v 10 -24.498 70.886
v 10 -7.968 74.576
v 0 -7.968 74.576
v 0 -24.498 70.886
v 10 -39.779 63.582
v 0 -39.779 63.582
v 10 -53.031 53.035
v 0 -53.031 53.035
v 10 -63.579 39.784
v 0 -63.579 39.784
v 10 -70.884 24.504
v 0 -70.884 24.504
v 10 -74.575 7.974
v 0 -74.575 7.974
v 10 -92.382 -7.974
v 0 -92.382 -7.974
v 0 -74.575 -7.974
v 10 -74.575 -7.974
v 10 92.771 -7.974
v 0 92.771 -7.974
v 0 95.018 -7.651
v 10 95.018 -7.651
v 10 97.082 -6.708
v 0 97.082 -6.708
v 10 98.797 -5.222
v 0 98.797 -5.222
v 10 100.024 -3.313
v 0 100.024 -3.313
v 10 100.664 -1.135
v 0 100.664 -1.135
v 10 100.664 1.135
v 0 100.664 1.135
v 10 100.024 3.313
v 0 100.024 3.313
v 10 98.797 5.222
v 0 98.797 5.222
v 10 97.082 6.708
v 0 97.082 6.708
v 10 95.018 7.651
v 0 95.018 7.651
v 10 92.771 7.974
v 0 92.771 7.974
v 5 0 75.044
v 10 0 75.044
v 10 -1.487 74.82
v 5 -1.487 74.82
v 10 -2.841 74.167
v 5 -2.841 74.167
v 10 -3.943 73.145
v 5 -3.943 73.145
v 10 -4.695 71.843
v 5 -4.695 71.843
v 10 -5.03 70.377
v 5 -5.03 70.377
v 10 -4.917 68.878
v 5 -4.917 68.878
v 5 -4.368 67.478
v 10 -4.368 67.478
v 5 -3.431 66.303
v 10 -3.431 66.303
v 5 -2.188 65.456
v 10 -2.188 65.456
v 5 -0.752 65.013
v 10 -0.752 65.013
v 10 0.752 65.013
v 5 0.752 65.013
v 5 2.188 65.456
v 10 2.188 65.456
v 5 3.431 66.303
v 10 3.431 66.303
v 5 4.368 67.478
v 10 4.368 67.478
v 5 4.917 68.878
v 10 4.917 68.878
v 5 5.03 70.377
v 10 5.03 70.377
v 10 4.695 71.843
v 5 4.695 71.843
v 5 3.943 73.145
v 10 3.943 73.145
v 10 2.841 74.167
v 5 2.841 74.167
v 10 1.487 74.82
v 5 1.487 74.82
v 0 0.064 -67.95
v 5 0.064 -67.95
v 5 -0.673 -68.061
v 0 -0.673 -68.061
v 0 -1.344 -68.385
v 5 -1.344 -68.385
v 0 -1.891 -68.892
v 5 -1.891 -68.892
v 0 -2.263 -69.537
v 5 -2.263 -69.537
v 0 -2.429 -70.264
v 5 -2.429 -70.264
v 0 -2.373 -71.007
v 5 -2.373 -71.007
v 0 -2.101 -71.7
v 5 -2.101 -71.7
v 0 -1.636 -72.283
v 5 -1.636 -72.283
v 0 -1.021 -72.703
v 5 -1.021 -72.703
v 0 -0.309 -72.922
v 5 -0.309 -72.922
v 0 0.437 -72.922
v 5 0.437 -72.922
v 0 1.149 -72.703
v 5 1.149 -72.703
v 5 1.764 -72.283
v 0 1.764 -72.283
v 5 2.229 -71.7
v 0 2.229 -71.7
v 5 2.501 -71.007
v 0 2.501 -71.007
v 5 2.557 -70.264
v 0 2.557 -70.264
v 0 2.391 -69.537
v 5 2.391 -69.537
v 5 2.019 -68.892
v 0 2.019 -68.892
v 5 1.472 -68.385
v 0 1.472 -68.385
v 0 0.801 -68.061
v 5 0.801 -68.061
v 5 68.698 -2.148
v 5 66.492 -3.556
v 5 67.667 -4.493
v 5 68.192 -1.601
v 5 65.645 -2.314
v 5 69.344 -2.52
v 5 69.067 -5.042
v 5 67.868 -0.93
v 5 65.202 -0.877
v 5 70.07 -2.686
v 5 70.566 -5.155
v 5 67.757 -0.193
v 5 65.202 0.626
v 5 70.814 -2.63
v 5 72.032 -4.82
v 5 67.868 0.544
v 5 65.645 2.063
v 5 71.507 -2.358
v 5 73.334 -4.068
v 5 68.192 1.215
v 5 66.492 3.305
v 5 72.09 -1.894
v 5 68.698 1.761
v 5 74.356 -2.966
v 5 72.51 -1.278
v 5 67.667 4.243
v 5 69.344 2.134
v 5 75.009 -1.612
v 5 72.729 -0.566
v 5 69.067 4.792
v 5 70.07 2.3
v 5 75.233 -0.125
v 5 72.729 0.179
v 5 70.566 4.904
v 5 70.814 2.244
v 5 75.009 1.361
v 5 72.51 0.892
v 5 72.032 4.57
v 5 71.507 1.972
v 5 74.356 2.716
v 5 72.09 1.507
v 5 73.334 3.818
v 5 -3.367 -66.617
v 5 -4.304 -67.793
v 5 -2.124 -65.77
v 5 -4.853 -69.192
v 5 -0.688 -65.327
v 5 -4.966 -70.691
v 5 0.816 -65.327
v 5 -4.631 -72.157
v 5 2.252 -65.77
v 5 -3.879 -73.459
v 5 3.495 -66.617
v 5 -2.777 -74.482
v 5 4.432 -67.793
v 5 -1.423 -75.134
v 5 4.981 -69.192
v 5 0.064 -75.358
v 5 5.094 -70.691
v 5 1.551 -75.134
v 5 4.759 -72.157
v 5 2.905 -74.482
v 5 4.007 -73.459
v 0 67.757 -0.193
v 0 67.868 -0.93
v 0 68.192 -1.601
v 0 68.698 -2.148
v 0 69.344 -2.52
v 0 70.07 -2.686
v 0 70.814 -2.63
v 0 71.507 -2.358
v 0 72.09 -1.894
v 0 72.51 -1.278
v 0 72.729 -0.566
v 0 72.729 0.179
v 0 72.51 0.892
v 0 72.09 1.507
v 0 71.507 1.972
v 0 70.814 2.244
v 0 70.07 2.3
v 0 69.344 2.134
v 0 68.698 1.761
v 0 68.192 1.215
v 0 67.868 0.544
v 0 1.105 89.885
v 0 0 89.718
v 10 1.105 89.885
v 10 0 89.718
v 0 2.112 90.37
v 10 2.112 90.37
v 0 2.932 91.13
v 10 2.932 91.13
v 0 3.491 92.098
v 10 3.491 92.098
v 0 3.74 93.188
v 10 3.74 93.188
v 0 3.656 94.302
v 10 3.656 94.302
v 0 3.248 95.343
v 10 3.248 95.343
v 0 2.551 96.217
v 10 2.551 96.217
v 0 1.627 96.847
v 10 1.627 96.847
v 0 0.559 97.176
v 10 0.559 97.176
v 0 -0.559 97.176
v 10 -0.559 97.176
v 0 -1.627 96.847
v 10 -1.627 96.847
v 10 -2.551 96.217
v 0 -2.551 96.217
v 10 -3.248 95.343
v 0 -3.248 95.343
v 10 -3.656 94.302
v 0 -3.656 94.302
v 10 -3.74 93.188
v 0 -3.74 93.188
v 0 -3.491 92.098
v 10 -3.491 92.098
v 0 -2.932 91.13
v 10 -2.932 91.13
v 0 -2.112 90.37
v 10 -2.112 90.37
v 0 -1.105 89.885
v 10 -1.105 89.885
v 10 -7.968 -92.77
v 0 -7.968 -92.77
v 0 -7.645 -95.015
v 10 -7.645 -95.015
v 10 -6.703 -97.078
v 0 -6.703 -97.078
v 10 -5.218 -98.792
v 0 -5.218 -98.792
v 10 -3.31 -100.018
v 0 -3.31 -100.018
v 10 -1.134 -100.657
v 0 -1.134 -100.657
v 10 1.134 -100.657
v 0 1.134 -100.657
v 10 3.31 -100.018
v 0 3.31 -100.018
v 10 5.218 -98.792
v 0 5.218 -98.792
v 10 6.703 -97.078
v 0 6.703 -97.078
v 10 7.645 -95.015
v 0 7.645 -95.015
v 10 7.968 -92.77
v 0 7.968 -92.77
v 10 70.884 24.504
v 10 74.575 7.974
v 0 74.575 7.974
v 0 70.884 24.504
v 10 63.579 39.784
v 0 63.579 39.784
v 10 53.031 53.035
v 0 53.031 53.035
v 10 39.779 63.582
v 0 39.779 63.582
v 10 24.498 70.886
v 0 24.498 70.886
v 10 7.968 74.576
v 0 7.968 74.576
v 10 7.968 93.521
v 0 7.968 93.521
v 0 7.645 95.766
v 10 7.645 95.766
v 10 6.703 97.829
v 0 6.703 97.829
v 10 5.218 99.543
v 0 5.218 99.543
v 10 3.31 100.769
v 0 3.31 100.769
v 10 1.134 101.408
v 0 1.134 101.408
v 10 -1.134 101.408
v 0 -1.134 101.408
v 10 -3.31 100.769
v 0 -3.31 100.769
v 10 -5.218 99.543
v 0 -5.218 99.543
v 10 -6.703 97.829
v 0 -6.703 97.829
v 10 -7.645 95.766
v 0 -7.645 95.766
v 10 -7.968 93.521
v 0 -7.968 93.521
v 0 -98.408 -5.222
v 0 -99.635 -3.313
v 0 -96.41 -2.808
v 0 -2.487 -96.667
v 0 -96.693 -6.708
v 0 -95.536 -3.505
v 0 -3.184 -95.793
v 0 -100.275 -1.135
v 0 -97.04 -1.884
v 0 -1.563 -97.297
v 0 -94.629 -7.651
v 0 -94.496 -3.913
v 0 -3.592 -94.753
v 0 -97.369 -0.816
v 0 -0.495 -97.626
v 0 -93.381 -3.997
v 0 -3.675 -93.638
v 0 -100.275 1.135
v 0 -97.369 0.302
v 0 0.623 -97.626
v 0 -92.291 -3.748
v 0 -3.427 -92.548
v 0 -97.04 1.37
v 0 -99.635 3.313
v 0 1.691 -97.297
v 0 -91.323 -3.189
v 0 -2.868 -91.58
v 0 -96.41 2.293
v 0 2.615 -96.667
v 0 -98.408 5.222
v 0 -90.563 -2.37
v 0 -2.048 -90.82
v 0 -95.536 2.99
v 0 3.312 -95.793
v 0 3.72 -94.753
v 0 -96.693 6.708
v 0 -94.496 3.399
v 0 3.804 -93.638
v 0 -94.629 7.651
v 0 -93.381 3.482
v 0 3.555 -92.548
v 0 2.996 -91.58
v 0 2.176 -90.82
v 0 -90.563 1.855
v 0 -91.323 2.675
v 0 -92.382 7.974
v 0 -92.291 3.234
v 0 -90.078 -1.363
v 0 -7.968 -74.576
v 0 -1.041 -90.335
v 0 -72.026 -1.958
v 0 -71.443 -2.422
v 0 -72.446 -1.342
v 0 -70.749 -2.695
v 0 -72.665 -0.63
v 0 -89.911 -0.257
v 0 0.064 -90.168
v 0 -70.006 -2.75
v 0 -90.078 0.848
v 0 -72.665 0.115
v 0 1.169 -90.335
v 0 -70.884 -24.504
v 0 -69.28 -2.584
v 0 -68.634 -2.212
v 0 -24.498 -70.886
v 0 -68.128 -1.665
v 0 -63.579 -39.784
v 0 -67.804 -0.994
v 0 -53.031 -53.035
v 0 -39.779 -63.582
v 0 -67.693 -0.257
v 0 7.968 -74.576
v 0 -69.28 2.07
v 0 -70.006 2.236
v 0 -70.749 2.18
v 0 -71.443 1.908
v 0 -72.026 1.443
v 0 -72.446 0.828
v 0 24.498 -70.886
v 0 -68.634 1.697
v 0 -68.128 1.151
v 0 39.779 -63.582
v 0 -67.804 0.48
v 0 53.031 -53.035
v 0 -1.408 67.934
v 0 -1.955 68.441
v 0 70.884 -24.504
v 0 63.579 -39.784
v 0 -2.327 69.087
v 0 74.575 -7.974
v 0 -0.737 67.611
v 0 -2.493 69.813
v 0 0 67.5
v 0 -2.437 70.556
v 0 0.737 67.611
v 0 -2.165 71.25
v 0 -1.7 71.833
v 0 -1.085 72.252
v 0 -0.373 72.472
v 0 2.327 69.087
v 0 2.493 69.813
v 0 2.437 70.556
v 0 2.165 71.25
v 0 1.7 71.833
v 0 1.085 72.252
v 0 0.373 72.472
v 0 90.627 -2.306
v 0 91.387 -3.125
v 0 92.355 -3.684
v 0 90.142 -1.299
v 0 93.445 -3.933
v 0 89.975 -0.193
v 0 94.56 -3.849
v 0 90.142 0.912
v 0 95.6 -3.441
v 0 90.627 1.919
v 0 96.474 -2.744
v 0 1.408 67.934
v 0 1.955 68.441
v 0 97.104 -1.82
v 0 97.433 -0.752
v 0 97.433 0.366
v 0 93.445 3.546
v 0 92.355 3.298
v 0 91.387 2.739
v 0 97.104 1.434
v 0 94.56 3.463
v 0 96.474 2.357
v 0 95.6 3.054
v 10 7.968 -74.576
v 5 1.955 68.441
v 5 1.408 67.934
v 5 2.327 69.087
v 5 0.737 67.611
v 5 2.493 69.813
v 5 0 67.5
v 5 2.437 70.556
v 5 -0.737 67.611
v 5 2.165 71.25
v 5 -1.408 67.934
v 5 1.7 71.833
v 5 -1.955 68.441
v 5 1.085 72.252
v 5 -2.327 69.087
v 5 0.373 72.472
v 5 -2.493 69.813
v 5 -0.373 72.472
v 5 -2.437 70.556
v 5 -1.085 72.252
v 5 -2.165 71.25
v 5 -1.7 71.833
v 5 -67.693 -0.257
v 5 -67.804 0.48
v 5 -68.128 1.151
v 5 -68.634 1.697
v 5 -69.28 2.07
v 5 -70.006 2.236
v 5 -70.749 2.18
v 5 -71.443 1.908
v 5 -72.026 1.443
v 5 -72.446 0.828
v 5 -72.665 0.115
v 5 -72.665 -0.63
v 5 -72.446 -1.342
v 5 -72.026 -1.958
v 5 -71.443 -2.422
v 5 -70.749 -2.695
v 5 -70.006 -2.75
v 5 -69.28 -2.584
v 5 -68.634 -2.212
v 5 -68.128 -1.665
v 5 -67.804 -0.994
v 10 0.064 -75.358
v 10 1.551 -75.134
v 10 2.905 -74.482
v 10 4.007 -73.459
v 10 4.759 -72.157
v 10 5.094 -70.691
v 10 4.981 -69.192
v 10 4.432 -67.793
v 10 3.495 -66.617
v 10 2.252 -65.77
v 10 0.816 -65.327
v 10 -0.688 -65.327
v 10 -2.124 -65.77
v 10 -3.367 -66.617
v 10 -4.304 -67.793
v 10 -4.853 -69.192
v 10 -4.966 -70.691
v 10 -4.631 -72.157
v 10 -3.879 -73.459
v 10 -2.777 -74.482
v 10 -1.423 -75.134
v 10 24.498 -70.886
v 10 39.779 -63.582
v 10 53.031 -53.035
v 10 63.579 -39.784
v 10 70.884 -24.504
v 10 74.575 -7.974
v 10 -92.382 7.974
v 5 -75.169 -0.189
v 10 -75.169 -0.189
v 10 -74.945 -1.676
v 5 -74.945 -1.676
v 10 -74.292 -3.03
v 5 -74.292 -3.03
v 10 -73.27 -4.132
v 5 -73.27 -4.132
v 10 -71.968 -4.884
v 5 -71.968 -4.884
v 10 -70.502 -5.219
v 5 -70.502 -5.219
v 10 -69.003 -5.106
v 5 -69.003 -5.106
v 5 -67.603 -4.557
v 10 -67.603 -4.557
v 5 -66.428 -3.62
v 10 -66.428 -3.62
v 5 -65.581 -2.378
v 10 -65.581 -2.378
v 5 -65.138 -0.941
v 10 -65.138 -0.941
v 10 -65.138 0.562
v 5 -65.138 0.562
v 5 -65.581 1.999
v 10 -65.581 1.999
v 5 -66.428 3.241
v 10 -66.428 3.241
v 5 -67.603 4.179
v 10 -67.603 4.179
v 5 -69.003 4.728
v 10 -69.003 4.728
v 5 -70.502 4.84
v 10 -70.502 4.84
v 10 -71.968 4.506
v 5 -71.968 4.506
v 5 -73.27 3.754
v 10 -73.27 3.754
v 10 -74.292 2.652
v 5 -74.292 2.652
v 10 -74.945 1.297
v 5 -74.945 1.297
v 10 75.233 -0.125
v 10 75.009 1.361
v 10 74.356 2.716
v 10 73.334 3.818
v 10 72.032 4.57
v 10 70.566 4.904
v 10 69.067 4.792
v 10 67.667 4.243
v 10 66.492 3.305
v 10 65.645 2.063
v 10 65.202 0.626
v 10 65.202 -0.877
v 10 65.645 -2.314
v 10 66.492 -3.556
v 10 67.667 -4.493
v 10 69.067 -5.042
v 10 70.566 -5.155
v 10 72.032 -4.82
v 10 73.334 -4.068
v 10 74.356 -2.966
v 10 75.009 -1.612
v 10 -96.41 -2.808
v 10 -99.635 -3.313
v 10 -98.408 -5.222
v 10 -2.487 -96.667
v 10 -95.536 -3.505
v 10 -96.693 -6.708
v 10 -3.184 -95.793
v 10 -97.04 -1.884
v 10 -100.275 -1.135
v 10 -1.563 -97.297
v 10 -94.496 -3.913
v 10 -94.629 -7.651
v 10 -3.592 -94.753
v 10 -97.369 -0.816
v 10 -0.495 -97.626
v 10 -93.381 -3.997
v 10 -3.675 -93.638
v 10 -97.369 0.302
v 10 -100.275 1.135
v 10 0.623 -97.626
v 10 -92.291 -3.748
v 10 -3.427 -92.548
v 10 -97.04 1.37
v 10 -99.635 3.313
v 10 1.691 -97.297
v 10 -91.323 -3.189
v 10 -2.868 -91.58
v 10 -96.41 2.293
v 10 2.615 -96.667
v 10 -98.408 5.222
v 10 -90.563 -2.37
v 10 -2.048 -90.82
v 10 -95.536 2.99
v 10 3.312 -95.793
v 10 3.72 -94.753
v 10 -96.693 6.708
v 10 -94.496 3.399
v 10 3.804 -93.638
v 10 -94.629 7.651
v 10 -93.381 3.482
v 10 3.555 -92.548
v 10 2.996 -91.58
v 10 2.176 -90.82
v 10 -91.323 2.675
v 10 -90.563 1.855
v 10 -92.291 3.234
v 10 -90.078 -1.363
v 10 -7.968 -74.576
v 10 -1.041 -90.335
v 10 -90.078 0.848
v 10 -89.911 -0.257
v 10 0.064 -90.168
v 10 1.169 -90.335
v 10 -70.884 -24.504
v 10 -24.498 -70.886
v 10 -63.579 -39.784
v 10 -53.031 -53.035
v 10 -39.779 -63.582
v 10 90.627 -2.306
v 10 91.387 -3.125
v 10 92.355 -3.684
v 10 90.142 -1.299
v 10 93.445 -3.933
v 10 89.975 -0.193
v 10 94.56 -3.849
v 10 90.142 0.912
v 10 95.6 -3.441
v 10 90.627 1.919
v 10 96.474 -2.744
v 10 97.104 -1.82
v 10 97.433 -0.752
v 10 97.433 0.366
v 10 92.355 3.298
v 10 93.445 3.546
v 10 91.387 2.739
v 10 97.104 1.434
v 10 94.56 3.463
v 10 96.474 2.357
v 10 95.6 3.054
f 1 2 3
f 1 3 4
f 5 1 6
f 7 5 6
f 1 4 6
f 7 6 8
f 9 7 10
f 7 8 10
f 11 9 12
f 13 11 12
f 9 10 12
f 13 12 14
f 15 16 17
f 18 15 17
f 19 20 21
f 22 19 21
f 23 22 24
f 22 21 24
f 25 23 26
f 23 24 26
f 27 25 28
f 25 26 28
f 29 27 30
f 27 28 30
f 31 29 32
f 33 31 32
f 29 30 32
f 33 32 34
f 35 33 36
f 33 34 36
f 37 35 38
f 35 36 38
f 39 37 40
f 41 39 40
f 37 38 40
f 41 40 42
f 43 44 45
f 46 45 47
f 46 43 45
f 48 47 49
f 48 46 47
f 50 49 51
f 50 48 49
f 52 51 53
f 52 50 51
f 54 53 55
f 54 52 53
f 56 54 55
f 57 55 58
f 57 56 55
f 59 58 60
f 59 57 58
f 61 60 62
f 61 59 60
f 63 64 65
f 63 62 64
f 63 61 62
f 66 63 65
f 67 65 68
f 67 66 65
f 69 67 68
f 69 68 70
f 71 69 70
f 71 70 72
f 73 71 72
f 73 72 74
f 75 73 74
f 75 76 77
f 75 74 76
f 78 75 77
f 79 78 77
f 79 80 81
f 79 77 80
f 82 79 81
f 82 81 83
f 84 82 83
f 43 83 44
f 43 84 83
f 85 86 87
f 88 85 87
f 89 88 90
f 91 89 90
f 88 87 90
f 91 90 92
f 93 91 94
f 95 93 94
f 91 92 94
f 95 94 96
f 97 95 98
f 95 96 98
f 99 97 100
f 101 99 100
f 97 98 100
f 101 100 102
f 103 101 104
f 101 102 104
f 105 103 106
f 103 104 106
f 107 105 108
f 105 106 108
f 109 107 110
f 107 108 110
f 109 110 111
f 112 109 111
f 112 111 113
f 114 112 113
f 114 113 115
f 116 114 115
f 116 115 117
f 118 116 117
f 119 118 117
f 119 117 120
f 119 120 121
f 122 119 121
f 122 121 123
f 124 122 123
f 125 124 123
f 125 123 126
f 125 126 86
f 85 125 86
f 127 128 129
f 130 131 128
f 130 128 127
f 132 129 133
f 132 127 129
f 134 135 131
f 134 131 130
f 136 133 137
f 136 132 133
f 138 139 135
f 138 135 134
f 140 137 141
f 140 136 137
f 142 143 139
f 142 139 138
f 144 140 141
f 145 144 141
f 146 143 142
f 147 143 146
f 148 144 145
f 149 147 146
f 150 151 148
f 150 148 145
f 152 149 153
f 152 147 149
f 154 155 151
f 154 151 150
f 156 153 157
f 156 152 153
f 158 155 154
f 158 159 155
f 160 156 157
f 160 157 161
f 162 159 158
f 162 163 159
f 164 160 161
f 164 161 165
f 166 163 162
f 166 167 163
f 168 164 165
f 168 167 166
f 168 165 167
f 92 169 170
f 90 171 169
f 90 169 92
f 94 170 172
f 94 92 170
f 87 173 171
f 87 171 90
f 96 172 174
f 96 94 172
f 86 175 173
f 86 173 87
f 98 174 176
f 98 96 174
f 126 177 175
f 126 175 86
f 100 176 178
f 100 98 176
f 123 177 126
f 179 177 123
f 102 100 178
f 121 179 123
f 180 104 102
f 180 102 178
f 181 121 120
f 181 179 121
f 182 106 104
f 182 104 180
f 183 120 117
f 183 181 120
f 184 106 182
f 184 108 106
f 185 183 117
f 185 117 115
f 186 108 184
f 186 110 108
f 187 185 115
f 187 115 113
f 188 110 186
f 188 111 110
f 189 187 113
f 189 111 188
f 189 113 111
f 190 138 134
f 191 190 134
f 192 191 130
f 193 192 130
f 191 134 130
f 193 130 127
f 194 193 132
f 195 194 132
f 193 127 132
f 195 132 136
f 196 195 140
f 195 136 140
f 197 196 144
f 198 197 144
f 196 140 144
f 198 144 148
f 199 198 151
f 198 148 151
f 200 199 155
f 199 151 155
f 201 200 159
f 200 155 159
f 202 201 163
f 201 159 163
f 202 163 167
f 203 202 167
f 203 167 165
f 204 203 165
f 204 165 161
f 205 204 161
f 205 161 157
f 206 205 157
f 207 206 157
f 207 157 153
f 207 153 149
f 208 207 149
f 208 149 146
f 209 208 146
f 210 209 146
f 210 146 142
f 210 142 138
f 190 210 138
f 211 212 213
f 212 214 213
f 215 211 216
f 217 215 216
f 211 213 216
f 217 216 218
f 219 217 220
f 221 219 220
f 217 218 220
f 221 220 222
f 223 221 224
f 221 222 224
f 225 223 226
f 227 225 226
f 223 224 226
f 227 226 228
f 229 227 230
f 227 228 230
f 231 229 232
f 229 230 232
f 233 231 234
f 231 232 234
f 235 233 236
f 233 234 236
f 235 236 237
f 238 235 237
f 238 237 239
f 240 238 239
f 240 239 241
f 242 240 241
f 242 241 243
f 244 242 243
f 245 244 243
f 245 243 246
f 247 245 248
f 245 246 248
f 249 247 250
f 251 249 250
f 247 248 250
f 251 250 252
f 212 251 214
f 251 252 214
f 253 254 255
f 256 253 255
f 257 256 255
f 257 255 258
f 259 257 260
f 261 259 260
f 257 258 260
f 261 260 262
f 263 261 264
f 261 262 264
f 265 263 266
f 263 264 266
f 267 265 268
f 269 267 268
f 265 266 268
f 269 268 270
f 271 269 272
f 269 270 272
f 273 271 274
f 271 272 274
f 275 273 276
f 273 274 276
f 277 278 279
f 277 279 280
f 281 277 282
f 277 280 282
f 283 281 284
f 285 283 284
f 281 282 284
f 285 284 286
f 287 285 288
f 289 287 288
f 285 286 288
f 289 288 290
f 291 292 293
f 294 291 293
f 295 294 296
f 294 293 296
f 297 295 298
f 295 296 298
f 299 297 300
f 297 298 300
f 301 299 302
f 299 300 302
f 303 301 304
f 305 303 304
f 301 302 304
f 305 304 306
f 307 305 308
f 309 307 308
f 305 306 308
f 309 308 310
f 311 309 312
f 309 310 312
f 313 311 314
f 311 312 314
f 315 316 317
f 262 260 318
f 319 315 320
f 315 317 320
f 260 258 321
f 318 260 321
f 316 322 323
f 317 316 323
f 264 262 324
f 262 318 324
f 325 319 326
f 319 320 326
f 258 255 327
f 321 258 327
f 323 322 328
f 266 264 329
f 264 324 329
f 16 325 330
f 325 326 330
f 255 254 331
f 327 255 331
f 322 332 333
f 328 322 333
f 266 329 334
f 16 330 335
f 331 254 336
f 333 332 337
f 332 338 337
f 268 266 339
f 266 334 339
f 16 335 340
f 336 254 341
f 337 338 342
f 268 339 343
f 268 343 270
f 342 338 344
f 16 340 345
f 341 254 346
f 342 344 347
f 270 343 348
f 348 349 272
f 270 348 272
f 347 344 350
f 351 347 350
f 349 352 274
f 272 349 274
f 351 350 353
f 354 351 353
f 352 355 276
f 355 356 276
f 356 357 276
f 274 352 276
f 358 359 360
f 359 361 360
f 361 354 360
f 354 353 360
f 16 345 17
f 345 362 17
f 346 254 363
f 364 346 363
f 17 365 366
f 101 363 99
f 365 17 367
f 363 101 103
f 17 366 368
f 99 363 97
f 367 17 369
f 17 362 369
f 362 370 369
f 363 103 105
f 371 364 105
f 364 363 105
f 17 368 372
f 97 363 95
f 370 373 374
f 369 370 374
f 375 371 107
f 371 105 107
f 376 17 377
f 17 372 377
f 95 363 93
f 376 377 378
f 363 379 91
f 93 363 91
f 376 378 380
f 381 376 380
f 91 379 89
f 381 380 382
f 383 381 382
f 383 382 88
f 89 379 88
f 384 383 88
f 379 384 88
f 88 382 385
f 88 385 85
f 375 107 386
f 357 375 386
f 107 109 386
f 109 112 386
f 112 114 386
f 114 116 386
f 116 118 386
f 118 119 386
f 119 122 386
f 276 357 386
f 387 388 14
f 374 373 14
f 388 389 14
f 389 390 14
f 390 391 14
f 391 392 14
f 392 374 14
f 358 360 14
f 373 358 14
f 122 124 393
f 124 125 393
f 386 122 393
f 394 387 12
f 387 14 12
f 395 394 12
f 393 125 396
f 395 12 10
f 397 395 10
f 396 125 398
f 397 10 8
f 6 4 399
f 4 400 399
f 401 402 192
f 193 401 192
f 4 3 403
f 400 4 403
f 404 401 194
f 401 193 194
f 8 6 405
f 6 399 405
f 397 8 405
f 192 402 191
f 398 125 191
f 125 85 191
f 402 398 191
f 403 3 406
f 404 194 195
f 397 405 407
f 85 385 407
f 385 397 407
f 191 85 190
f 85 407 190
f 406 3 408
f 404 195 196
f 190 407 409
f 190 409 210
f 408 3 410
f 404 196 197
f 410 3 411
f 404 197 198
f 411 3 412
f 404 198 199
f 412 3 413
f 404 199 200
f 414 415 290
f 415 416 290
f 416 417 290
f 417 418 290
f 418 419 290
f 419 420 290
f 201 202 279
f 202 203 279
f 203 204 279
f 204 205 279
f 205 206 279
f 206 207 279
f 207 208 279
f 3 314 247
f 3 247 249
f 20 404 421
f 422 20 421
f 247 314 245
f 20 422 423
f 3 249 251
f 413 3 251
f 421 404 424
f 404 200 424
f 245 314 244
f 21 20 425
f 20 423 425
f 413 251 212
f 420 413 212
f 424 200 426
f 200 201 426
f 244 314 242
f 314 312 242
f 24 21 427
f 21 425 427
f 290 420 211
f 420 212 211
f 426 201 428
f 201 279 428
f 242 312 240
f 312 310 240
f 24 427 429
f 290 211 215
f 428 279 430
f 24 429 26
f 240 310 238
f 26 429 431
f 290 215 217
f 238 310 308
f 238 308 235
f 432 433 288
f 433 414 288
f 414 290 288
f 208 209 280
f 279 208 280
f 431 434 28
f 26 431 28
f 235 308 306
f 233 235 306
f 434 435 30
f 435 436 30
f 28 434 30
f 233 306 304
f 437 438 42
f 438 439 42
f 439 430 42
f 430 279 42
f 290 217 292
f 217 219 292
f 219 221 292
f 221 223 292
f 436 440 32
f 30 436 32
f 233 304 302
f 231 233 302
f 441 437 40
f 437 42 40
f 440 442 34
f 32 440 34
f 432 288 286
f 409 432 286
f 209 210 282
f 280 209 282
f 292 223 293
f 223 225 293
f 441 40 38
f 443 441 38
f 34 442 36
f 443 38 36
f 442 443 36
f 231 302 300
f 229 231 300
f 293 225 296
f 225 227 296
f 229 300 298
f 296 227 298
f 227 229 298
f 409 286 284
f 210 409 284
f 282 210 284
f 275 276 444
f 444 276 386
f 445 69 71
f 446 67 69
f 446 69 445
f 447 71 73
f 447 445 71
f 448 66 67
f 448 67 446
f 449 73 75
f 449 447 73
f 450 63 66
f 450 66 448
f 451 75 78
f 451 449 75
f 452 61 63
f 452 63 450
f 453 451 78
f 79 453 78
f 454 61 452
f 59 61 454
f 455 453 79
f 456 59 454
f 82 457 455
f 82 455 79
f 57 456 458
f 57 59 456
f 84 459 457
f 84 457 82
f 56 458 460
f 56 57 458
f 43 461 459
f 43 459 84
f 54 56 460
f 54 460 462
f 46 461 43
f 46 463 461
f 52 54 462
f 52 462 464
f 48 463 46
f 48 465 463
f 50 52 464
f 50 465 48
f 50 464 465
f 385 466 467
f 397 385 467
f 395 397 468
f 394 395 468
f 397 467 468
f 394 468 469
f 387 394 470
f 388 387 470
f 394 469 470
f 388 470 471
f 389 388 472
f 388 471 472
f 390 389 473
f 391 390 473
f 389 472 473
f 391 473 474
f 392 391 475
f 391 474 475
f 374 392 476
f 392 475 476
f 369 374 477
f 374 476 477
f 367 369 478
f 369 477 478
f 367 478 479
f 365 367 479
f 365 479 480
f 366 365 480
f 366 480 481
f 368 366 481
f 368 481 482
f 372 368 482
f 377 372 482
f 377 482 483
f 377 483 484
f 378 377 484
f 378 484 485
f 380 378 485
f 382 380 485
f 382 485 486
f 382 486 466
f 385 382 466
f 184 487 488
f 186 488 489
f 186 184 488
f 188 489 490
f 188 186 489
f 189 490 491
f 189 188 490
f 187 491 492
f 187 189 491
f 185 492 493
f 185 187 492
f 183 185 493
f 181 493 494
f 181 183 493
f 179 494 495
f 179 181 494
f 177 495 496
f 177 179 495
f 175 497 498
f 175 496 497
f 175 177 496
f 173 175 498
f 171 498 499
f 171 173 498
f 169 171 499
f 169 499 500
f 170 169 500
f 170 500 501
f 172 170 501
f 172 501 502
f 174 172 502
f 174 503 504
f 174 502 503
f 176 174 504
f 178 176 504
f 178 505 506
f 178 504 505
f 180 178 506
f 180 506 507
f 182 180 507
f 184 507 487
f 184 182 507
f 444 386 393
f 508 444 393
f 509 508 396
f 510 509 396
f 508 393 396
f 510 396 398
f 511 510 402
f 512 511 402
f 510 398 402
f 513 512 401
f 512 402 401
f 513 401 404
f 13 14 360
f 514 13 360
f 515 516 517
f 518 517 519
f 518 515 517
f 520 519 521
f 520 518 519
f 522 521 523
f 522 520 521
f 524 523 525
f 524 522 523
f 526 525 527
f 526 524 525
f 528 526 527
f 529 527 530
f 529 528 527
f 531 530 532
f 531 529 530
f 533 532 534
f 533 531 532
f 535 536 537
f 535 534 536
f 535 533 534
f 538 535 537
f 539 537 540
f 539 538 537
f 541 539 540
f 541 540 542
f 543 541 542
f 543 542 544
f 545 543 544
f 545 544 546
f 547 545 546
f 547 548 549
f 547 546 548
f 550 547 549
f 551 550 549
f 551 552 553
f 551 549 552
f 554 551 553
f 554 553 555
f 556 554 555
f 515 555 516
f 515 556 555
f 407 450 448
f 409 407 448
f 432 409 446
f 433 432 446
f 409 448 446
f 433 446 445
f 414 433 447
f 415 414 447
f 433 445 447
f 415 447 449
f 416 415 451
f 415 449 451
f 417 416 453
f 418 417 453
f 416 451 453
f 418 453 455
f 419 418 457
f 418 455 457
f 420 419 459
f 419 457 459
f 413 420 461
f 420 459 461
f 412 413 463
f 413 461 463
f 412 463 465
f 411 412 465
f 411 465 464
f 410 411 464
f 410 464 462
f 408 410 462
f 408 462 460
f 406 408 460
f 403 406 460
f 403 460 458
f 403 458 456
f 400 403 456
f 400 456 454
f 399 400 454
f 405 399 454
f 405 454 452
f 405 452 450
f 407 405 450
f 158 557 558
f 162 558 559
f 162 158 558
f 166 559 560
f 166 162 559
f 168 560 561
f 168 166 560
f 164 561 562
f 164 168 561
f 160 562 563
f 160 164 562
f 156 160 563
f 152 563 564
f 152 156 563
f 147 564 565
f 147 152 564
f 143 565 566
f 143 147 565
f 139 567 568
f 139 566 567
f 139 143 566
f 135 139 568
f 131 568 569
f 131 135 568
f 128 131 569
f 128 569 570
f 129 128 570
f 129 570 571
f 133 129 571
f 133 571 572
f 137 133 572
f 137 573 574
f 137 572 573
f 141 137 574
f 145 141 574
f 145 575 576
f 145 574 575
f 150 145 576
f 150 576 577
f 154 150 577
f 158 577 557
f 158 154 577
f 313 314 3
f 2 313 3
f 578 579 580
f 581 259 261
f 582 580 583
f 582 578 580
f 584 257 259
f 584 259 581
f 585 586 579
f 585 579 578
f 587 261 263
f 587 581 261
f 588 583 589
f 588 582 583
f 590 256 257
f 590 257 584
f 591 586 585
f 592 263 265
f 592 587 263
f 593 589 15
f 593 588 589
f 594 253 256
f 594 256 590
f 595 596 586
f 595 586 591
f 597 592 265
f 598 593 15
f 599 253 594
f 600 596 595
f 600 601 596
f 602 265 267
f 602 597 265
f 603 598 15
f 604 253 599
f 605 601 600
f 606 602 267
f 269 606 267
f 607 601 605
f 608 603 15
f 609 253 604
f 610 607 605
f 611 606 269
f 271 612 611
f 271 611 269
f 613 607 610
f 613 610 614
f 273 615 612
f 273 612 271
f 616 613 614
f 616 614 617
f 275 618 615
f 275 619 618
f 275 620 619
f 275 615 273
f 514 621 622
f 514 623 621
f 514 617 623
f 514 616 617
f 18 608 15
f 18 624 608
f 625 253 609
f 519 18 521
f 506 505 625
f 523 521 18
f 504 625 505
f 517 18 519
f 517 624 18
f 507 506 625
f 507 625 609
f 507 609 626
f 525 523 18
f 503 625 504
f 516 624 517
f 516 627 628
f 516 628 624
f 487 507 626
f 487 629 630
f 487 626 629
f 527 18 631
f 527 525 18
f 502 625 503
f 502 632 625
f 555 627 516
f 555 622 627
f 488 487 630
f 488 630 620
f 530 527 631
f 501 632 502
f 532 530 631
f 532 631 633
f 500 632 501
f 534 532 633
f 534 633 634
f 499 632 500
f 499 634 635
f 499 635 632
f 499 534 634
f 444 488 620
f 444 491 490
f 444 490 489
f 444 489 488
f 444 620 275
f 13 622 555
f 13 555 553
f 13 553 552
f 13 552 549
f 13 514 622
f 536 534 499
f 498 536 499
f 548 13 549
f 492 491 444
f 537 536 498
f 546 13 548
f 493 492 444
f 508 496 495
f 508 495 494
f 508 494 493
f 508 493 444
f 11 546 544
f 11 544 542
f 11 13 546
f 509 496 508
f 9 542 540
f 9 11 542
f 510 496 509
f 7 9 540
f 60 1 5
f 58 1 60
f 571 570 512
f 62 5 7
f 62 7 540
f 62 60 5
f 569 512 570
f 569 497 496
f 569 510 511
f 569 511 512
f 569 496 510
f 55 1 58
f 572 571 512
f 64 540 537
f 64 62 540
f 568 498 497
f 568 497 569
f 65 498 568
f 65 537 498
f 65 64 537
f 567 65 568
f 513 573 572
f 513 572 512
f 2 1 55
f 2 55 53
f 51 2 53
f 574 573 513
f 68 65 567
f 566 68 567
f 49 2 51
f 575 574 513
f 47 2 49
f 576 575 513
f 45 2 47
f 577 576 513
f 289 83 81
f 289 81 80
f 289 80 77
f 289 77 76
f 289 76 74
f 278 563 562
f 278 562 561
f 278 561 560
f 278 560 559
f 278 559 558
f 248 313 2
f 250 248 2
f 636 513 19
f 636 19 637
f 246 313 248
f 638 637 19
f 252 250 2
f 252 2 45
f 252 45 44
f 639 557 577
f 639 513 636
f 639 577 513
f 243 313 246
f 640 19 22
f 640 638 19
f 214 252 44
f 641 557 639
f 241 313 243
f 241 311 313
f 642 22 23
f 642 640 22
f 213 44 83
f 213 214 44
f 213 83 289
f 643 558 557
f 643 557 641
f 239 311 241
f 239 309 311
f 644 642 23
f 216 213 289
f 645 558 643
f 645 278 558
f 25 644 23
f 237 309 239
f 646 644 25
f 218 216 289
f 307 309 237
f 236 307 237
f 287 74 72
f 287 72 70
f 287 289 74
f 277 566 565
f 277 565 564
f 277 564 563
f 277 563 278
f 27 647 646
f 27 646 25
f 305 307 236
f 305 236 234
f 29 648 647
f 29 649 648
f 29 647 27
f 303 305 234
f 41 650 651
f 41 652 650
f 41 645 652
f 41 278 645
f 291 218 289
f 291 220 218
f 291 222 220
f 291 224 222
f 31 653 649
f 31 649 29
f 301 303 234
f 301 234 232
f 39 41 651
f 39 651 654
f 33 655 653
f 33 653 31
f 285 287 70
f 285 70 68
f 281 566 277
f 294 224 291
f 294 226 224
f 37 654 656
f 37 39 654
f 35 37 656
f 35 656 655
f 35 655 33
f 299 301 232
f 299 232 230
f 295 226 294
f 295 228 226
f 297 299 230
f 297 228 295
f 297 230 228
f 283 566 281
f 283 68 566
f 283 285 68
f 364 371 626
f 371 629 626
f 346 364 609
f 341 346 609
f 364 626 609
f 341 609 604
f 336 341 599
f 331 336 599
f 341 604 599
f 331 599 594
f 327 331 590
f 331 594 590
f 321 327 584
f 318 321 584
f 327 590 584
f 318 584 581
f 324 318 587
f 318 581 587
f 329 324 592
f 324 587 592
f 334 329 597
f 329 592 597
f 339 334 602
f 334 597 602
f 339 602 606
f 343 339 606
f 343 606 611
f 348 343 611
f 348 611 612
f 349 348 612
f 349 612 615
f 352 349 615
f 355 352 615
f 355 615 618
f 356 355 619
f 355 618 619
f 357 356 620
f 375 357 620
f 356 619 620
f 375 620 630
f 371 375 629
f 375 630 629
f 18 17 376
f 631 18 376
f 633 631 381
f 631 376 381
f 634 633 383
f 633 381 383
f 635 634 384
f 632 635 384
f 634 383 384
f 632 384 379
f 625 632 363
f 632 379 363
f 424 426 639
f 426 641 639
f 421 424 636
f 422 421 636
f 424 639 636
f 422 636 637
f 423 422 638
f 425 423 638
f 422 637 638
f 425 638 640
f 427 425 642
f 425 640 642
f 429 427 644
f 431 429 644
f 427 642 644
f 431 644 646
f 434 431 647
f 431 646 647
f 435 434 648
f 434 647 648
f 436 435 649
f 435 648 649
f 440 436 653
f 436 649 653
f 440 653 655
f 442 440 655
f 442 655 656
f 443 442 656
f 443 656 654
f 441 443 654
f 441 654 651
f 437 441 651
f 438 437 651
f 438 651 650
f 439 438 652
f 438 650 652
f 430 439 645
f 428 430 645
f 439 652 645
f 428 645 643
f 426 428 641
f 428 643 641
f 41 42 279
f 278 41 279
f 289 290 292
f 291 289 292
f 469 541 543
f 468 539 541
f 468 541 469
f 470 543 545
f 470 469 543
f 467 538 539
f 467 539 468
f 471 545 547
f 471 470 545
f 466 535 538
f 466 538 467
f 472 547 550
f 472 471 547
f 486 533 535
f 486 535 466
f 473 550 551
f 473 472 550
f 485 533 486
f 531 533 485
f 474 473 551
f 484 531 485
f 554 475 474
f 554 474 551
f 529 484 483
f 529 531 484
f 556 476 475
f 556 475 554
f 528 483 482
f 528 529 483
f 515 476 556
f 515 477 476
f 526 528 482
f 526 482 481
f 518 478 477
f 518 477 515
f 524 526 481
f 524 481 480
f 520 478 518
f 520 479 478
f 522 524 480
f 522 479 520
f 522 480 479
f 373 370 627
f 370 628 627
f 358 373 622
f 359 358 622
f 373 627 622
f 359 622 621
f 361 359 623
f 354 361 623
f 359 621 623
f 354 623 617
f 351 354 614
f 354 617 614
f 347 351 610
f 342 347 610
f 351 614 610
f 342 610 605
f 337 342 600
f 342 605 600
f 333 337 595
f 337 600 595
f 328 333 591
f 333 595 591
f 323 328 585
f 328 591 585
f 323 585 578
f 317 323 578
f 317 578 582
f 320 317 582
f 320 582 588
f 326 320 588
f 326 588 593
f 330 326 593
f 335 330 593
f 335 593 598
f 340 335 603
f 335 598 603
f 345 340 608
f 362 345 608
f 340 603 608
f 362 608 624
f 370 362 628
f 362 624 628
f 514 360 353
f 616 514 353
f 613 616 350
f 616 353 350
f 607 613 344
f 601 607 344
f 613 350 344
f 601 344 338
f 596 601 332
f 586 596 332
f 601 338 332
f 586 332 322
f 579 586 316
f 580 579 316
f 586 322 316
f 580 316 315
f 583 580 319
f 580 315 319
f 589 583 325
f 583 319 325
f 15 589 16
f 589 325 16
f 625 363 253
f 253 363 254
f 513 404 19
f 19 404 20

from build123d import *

# Parameters (mm, degrees)
SKETCH1_R           = 75
BOSS_EXTRUDE1_DEPTH = 10
BOSS_EXTRUDE2_DEPTH = 10
SKETCH3_R           = 2.5
SKETCH3_R_2         = 3.75
CUT_EXTRUDE1_DEPTH  = 144.351459106
CIRPATTERN1_COUNT   = 4
CUT_EXTRUDE2_START  = -5
SKETCH4_R           = 5.043629395
CUT_EXTRUDE2_DEPTH  = 149.351459106
CIRPATTERN2_COUNT   = 4


with BuildPart() as part:
    # Sketch1 → Boss-Extrude1 (new body)
    with BuildSketch(Plane.YZ):
        with Locations(Location((0, 0, 0), (0, 0, 270))):
            Circle(SKETCH1_R)
    extrude(amount=BOSS_EXTRUDE1_DEPTH)

    # Sketch2 → Boss-Extrude2 (add)
    with BuildSketch(Plane(origin=(0, 0, 0), x_dir=(0, -1, 0), z_dir=(-1, 0, 0))):
        with BuildLine():
            Line((-92.771012238, 7.974028306), (92.382035247, 7.974028306))
            ThreePointArc((92.382035247, 7.974028306), (100.356063553, 0), (92.382035247, -7.974028306))
            Line((92.382035247, -7.974028306), (-92.771012238, -7.974028306))
            ThreePointArc((-92.771012238, -7.974028306), (-100.745040543, 0), (-92.771012238, 7.974028306))
        make_face()
        with BuildLine():
            Line((-7.968256638, -92.769682141), (-7.968256638, 93.521041486))
            ThreePointArc((-7.968256638, 93.521041486), (0, 101.489298124), (7.968256638, 93.521041486))
            Line((7.968256638, 93.521041486), (7.968256638, -92.769682141))
            ThreePointArc((7.968256638, -92.769682141), (0, -100.73793878), (-7.968256638, -92.769682141))
        make_face()
    extrude(amount=-BOSS_EXTRUDE2_DEPTH)

    # Sketch3 → Cut-Extrude1 (cut, symmetric)
    with BuildSketch(Plane.YZ.offset(10)):
        with Locations(Location((0, 70, 0), (0, 0, 270))):
            Circle(SKETCH3_R)
        with Locations(Location((0, 93.46793349, 0), (0, 0, 270))):
            Circle(SKETCH3_R_2)
    cut_extrude1 = extrude(amount=CUT_EXTRUDE1_DEPTH, both=True, mode=Mode.SUBTRACT)

    # CirPattern1: Cut-Extrude1 ×4 about axis
    cirpattern1_axis = Axis((0, 0.032009754, -0.225189286), (1, 0, 0))
    for i in range(1, CIRPATTERN1_COUNT):
        add(cut_extrude1.rotate(cirpattern1_axis, i * 360 / CIRPATTERN1_COUNT), mode=Mode.SUBTRACT)

    # Sketch4 → Cut-Extrude2 (cut)
    with BuildSketch(Plane.YZ.offset(10).offset(CUT_EXTRUDE2_START)):
        with Locations(Location((0, 70, 0), (0, 0, 90))):
            Circle(SKETCH4_R)
    cut_extrude2 = extrude(amount=CUT_EXTRUDE2_DEPTH, mode=Mode.SUBTRACT)

    # CirPattern2: Cut-Extrude2 ×4 about axis
    cirpattern2_axis = Axis((0, 0.032003773, -0.157220476), (1, 0, 0))
    for i in range(1, CIRPATTERN2_COUNT):
        add(cut_extrude2.rotate(cirpattern2_axis, i * 360 / CIRPATTERN2_COUNT), mode=Mode.SUBTRACT)


solid = part.part
